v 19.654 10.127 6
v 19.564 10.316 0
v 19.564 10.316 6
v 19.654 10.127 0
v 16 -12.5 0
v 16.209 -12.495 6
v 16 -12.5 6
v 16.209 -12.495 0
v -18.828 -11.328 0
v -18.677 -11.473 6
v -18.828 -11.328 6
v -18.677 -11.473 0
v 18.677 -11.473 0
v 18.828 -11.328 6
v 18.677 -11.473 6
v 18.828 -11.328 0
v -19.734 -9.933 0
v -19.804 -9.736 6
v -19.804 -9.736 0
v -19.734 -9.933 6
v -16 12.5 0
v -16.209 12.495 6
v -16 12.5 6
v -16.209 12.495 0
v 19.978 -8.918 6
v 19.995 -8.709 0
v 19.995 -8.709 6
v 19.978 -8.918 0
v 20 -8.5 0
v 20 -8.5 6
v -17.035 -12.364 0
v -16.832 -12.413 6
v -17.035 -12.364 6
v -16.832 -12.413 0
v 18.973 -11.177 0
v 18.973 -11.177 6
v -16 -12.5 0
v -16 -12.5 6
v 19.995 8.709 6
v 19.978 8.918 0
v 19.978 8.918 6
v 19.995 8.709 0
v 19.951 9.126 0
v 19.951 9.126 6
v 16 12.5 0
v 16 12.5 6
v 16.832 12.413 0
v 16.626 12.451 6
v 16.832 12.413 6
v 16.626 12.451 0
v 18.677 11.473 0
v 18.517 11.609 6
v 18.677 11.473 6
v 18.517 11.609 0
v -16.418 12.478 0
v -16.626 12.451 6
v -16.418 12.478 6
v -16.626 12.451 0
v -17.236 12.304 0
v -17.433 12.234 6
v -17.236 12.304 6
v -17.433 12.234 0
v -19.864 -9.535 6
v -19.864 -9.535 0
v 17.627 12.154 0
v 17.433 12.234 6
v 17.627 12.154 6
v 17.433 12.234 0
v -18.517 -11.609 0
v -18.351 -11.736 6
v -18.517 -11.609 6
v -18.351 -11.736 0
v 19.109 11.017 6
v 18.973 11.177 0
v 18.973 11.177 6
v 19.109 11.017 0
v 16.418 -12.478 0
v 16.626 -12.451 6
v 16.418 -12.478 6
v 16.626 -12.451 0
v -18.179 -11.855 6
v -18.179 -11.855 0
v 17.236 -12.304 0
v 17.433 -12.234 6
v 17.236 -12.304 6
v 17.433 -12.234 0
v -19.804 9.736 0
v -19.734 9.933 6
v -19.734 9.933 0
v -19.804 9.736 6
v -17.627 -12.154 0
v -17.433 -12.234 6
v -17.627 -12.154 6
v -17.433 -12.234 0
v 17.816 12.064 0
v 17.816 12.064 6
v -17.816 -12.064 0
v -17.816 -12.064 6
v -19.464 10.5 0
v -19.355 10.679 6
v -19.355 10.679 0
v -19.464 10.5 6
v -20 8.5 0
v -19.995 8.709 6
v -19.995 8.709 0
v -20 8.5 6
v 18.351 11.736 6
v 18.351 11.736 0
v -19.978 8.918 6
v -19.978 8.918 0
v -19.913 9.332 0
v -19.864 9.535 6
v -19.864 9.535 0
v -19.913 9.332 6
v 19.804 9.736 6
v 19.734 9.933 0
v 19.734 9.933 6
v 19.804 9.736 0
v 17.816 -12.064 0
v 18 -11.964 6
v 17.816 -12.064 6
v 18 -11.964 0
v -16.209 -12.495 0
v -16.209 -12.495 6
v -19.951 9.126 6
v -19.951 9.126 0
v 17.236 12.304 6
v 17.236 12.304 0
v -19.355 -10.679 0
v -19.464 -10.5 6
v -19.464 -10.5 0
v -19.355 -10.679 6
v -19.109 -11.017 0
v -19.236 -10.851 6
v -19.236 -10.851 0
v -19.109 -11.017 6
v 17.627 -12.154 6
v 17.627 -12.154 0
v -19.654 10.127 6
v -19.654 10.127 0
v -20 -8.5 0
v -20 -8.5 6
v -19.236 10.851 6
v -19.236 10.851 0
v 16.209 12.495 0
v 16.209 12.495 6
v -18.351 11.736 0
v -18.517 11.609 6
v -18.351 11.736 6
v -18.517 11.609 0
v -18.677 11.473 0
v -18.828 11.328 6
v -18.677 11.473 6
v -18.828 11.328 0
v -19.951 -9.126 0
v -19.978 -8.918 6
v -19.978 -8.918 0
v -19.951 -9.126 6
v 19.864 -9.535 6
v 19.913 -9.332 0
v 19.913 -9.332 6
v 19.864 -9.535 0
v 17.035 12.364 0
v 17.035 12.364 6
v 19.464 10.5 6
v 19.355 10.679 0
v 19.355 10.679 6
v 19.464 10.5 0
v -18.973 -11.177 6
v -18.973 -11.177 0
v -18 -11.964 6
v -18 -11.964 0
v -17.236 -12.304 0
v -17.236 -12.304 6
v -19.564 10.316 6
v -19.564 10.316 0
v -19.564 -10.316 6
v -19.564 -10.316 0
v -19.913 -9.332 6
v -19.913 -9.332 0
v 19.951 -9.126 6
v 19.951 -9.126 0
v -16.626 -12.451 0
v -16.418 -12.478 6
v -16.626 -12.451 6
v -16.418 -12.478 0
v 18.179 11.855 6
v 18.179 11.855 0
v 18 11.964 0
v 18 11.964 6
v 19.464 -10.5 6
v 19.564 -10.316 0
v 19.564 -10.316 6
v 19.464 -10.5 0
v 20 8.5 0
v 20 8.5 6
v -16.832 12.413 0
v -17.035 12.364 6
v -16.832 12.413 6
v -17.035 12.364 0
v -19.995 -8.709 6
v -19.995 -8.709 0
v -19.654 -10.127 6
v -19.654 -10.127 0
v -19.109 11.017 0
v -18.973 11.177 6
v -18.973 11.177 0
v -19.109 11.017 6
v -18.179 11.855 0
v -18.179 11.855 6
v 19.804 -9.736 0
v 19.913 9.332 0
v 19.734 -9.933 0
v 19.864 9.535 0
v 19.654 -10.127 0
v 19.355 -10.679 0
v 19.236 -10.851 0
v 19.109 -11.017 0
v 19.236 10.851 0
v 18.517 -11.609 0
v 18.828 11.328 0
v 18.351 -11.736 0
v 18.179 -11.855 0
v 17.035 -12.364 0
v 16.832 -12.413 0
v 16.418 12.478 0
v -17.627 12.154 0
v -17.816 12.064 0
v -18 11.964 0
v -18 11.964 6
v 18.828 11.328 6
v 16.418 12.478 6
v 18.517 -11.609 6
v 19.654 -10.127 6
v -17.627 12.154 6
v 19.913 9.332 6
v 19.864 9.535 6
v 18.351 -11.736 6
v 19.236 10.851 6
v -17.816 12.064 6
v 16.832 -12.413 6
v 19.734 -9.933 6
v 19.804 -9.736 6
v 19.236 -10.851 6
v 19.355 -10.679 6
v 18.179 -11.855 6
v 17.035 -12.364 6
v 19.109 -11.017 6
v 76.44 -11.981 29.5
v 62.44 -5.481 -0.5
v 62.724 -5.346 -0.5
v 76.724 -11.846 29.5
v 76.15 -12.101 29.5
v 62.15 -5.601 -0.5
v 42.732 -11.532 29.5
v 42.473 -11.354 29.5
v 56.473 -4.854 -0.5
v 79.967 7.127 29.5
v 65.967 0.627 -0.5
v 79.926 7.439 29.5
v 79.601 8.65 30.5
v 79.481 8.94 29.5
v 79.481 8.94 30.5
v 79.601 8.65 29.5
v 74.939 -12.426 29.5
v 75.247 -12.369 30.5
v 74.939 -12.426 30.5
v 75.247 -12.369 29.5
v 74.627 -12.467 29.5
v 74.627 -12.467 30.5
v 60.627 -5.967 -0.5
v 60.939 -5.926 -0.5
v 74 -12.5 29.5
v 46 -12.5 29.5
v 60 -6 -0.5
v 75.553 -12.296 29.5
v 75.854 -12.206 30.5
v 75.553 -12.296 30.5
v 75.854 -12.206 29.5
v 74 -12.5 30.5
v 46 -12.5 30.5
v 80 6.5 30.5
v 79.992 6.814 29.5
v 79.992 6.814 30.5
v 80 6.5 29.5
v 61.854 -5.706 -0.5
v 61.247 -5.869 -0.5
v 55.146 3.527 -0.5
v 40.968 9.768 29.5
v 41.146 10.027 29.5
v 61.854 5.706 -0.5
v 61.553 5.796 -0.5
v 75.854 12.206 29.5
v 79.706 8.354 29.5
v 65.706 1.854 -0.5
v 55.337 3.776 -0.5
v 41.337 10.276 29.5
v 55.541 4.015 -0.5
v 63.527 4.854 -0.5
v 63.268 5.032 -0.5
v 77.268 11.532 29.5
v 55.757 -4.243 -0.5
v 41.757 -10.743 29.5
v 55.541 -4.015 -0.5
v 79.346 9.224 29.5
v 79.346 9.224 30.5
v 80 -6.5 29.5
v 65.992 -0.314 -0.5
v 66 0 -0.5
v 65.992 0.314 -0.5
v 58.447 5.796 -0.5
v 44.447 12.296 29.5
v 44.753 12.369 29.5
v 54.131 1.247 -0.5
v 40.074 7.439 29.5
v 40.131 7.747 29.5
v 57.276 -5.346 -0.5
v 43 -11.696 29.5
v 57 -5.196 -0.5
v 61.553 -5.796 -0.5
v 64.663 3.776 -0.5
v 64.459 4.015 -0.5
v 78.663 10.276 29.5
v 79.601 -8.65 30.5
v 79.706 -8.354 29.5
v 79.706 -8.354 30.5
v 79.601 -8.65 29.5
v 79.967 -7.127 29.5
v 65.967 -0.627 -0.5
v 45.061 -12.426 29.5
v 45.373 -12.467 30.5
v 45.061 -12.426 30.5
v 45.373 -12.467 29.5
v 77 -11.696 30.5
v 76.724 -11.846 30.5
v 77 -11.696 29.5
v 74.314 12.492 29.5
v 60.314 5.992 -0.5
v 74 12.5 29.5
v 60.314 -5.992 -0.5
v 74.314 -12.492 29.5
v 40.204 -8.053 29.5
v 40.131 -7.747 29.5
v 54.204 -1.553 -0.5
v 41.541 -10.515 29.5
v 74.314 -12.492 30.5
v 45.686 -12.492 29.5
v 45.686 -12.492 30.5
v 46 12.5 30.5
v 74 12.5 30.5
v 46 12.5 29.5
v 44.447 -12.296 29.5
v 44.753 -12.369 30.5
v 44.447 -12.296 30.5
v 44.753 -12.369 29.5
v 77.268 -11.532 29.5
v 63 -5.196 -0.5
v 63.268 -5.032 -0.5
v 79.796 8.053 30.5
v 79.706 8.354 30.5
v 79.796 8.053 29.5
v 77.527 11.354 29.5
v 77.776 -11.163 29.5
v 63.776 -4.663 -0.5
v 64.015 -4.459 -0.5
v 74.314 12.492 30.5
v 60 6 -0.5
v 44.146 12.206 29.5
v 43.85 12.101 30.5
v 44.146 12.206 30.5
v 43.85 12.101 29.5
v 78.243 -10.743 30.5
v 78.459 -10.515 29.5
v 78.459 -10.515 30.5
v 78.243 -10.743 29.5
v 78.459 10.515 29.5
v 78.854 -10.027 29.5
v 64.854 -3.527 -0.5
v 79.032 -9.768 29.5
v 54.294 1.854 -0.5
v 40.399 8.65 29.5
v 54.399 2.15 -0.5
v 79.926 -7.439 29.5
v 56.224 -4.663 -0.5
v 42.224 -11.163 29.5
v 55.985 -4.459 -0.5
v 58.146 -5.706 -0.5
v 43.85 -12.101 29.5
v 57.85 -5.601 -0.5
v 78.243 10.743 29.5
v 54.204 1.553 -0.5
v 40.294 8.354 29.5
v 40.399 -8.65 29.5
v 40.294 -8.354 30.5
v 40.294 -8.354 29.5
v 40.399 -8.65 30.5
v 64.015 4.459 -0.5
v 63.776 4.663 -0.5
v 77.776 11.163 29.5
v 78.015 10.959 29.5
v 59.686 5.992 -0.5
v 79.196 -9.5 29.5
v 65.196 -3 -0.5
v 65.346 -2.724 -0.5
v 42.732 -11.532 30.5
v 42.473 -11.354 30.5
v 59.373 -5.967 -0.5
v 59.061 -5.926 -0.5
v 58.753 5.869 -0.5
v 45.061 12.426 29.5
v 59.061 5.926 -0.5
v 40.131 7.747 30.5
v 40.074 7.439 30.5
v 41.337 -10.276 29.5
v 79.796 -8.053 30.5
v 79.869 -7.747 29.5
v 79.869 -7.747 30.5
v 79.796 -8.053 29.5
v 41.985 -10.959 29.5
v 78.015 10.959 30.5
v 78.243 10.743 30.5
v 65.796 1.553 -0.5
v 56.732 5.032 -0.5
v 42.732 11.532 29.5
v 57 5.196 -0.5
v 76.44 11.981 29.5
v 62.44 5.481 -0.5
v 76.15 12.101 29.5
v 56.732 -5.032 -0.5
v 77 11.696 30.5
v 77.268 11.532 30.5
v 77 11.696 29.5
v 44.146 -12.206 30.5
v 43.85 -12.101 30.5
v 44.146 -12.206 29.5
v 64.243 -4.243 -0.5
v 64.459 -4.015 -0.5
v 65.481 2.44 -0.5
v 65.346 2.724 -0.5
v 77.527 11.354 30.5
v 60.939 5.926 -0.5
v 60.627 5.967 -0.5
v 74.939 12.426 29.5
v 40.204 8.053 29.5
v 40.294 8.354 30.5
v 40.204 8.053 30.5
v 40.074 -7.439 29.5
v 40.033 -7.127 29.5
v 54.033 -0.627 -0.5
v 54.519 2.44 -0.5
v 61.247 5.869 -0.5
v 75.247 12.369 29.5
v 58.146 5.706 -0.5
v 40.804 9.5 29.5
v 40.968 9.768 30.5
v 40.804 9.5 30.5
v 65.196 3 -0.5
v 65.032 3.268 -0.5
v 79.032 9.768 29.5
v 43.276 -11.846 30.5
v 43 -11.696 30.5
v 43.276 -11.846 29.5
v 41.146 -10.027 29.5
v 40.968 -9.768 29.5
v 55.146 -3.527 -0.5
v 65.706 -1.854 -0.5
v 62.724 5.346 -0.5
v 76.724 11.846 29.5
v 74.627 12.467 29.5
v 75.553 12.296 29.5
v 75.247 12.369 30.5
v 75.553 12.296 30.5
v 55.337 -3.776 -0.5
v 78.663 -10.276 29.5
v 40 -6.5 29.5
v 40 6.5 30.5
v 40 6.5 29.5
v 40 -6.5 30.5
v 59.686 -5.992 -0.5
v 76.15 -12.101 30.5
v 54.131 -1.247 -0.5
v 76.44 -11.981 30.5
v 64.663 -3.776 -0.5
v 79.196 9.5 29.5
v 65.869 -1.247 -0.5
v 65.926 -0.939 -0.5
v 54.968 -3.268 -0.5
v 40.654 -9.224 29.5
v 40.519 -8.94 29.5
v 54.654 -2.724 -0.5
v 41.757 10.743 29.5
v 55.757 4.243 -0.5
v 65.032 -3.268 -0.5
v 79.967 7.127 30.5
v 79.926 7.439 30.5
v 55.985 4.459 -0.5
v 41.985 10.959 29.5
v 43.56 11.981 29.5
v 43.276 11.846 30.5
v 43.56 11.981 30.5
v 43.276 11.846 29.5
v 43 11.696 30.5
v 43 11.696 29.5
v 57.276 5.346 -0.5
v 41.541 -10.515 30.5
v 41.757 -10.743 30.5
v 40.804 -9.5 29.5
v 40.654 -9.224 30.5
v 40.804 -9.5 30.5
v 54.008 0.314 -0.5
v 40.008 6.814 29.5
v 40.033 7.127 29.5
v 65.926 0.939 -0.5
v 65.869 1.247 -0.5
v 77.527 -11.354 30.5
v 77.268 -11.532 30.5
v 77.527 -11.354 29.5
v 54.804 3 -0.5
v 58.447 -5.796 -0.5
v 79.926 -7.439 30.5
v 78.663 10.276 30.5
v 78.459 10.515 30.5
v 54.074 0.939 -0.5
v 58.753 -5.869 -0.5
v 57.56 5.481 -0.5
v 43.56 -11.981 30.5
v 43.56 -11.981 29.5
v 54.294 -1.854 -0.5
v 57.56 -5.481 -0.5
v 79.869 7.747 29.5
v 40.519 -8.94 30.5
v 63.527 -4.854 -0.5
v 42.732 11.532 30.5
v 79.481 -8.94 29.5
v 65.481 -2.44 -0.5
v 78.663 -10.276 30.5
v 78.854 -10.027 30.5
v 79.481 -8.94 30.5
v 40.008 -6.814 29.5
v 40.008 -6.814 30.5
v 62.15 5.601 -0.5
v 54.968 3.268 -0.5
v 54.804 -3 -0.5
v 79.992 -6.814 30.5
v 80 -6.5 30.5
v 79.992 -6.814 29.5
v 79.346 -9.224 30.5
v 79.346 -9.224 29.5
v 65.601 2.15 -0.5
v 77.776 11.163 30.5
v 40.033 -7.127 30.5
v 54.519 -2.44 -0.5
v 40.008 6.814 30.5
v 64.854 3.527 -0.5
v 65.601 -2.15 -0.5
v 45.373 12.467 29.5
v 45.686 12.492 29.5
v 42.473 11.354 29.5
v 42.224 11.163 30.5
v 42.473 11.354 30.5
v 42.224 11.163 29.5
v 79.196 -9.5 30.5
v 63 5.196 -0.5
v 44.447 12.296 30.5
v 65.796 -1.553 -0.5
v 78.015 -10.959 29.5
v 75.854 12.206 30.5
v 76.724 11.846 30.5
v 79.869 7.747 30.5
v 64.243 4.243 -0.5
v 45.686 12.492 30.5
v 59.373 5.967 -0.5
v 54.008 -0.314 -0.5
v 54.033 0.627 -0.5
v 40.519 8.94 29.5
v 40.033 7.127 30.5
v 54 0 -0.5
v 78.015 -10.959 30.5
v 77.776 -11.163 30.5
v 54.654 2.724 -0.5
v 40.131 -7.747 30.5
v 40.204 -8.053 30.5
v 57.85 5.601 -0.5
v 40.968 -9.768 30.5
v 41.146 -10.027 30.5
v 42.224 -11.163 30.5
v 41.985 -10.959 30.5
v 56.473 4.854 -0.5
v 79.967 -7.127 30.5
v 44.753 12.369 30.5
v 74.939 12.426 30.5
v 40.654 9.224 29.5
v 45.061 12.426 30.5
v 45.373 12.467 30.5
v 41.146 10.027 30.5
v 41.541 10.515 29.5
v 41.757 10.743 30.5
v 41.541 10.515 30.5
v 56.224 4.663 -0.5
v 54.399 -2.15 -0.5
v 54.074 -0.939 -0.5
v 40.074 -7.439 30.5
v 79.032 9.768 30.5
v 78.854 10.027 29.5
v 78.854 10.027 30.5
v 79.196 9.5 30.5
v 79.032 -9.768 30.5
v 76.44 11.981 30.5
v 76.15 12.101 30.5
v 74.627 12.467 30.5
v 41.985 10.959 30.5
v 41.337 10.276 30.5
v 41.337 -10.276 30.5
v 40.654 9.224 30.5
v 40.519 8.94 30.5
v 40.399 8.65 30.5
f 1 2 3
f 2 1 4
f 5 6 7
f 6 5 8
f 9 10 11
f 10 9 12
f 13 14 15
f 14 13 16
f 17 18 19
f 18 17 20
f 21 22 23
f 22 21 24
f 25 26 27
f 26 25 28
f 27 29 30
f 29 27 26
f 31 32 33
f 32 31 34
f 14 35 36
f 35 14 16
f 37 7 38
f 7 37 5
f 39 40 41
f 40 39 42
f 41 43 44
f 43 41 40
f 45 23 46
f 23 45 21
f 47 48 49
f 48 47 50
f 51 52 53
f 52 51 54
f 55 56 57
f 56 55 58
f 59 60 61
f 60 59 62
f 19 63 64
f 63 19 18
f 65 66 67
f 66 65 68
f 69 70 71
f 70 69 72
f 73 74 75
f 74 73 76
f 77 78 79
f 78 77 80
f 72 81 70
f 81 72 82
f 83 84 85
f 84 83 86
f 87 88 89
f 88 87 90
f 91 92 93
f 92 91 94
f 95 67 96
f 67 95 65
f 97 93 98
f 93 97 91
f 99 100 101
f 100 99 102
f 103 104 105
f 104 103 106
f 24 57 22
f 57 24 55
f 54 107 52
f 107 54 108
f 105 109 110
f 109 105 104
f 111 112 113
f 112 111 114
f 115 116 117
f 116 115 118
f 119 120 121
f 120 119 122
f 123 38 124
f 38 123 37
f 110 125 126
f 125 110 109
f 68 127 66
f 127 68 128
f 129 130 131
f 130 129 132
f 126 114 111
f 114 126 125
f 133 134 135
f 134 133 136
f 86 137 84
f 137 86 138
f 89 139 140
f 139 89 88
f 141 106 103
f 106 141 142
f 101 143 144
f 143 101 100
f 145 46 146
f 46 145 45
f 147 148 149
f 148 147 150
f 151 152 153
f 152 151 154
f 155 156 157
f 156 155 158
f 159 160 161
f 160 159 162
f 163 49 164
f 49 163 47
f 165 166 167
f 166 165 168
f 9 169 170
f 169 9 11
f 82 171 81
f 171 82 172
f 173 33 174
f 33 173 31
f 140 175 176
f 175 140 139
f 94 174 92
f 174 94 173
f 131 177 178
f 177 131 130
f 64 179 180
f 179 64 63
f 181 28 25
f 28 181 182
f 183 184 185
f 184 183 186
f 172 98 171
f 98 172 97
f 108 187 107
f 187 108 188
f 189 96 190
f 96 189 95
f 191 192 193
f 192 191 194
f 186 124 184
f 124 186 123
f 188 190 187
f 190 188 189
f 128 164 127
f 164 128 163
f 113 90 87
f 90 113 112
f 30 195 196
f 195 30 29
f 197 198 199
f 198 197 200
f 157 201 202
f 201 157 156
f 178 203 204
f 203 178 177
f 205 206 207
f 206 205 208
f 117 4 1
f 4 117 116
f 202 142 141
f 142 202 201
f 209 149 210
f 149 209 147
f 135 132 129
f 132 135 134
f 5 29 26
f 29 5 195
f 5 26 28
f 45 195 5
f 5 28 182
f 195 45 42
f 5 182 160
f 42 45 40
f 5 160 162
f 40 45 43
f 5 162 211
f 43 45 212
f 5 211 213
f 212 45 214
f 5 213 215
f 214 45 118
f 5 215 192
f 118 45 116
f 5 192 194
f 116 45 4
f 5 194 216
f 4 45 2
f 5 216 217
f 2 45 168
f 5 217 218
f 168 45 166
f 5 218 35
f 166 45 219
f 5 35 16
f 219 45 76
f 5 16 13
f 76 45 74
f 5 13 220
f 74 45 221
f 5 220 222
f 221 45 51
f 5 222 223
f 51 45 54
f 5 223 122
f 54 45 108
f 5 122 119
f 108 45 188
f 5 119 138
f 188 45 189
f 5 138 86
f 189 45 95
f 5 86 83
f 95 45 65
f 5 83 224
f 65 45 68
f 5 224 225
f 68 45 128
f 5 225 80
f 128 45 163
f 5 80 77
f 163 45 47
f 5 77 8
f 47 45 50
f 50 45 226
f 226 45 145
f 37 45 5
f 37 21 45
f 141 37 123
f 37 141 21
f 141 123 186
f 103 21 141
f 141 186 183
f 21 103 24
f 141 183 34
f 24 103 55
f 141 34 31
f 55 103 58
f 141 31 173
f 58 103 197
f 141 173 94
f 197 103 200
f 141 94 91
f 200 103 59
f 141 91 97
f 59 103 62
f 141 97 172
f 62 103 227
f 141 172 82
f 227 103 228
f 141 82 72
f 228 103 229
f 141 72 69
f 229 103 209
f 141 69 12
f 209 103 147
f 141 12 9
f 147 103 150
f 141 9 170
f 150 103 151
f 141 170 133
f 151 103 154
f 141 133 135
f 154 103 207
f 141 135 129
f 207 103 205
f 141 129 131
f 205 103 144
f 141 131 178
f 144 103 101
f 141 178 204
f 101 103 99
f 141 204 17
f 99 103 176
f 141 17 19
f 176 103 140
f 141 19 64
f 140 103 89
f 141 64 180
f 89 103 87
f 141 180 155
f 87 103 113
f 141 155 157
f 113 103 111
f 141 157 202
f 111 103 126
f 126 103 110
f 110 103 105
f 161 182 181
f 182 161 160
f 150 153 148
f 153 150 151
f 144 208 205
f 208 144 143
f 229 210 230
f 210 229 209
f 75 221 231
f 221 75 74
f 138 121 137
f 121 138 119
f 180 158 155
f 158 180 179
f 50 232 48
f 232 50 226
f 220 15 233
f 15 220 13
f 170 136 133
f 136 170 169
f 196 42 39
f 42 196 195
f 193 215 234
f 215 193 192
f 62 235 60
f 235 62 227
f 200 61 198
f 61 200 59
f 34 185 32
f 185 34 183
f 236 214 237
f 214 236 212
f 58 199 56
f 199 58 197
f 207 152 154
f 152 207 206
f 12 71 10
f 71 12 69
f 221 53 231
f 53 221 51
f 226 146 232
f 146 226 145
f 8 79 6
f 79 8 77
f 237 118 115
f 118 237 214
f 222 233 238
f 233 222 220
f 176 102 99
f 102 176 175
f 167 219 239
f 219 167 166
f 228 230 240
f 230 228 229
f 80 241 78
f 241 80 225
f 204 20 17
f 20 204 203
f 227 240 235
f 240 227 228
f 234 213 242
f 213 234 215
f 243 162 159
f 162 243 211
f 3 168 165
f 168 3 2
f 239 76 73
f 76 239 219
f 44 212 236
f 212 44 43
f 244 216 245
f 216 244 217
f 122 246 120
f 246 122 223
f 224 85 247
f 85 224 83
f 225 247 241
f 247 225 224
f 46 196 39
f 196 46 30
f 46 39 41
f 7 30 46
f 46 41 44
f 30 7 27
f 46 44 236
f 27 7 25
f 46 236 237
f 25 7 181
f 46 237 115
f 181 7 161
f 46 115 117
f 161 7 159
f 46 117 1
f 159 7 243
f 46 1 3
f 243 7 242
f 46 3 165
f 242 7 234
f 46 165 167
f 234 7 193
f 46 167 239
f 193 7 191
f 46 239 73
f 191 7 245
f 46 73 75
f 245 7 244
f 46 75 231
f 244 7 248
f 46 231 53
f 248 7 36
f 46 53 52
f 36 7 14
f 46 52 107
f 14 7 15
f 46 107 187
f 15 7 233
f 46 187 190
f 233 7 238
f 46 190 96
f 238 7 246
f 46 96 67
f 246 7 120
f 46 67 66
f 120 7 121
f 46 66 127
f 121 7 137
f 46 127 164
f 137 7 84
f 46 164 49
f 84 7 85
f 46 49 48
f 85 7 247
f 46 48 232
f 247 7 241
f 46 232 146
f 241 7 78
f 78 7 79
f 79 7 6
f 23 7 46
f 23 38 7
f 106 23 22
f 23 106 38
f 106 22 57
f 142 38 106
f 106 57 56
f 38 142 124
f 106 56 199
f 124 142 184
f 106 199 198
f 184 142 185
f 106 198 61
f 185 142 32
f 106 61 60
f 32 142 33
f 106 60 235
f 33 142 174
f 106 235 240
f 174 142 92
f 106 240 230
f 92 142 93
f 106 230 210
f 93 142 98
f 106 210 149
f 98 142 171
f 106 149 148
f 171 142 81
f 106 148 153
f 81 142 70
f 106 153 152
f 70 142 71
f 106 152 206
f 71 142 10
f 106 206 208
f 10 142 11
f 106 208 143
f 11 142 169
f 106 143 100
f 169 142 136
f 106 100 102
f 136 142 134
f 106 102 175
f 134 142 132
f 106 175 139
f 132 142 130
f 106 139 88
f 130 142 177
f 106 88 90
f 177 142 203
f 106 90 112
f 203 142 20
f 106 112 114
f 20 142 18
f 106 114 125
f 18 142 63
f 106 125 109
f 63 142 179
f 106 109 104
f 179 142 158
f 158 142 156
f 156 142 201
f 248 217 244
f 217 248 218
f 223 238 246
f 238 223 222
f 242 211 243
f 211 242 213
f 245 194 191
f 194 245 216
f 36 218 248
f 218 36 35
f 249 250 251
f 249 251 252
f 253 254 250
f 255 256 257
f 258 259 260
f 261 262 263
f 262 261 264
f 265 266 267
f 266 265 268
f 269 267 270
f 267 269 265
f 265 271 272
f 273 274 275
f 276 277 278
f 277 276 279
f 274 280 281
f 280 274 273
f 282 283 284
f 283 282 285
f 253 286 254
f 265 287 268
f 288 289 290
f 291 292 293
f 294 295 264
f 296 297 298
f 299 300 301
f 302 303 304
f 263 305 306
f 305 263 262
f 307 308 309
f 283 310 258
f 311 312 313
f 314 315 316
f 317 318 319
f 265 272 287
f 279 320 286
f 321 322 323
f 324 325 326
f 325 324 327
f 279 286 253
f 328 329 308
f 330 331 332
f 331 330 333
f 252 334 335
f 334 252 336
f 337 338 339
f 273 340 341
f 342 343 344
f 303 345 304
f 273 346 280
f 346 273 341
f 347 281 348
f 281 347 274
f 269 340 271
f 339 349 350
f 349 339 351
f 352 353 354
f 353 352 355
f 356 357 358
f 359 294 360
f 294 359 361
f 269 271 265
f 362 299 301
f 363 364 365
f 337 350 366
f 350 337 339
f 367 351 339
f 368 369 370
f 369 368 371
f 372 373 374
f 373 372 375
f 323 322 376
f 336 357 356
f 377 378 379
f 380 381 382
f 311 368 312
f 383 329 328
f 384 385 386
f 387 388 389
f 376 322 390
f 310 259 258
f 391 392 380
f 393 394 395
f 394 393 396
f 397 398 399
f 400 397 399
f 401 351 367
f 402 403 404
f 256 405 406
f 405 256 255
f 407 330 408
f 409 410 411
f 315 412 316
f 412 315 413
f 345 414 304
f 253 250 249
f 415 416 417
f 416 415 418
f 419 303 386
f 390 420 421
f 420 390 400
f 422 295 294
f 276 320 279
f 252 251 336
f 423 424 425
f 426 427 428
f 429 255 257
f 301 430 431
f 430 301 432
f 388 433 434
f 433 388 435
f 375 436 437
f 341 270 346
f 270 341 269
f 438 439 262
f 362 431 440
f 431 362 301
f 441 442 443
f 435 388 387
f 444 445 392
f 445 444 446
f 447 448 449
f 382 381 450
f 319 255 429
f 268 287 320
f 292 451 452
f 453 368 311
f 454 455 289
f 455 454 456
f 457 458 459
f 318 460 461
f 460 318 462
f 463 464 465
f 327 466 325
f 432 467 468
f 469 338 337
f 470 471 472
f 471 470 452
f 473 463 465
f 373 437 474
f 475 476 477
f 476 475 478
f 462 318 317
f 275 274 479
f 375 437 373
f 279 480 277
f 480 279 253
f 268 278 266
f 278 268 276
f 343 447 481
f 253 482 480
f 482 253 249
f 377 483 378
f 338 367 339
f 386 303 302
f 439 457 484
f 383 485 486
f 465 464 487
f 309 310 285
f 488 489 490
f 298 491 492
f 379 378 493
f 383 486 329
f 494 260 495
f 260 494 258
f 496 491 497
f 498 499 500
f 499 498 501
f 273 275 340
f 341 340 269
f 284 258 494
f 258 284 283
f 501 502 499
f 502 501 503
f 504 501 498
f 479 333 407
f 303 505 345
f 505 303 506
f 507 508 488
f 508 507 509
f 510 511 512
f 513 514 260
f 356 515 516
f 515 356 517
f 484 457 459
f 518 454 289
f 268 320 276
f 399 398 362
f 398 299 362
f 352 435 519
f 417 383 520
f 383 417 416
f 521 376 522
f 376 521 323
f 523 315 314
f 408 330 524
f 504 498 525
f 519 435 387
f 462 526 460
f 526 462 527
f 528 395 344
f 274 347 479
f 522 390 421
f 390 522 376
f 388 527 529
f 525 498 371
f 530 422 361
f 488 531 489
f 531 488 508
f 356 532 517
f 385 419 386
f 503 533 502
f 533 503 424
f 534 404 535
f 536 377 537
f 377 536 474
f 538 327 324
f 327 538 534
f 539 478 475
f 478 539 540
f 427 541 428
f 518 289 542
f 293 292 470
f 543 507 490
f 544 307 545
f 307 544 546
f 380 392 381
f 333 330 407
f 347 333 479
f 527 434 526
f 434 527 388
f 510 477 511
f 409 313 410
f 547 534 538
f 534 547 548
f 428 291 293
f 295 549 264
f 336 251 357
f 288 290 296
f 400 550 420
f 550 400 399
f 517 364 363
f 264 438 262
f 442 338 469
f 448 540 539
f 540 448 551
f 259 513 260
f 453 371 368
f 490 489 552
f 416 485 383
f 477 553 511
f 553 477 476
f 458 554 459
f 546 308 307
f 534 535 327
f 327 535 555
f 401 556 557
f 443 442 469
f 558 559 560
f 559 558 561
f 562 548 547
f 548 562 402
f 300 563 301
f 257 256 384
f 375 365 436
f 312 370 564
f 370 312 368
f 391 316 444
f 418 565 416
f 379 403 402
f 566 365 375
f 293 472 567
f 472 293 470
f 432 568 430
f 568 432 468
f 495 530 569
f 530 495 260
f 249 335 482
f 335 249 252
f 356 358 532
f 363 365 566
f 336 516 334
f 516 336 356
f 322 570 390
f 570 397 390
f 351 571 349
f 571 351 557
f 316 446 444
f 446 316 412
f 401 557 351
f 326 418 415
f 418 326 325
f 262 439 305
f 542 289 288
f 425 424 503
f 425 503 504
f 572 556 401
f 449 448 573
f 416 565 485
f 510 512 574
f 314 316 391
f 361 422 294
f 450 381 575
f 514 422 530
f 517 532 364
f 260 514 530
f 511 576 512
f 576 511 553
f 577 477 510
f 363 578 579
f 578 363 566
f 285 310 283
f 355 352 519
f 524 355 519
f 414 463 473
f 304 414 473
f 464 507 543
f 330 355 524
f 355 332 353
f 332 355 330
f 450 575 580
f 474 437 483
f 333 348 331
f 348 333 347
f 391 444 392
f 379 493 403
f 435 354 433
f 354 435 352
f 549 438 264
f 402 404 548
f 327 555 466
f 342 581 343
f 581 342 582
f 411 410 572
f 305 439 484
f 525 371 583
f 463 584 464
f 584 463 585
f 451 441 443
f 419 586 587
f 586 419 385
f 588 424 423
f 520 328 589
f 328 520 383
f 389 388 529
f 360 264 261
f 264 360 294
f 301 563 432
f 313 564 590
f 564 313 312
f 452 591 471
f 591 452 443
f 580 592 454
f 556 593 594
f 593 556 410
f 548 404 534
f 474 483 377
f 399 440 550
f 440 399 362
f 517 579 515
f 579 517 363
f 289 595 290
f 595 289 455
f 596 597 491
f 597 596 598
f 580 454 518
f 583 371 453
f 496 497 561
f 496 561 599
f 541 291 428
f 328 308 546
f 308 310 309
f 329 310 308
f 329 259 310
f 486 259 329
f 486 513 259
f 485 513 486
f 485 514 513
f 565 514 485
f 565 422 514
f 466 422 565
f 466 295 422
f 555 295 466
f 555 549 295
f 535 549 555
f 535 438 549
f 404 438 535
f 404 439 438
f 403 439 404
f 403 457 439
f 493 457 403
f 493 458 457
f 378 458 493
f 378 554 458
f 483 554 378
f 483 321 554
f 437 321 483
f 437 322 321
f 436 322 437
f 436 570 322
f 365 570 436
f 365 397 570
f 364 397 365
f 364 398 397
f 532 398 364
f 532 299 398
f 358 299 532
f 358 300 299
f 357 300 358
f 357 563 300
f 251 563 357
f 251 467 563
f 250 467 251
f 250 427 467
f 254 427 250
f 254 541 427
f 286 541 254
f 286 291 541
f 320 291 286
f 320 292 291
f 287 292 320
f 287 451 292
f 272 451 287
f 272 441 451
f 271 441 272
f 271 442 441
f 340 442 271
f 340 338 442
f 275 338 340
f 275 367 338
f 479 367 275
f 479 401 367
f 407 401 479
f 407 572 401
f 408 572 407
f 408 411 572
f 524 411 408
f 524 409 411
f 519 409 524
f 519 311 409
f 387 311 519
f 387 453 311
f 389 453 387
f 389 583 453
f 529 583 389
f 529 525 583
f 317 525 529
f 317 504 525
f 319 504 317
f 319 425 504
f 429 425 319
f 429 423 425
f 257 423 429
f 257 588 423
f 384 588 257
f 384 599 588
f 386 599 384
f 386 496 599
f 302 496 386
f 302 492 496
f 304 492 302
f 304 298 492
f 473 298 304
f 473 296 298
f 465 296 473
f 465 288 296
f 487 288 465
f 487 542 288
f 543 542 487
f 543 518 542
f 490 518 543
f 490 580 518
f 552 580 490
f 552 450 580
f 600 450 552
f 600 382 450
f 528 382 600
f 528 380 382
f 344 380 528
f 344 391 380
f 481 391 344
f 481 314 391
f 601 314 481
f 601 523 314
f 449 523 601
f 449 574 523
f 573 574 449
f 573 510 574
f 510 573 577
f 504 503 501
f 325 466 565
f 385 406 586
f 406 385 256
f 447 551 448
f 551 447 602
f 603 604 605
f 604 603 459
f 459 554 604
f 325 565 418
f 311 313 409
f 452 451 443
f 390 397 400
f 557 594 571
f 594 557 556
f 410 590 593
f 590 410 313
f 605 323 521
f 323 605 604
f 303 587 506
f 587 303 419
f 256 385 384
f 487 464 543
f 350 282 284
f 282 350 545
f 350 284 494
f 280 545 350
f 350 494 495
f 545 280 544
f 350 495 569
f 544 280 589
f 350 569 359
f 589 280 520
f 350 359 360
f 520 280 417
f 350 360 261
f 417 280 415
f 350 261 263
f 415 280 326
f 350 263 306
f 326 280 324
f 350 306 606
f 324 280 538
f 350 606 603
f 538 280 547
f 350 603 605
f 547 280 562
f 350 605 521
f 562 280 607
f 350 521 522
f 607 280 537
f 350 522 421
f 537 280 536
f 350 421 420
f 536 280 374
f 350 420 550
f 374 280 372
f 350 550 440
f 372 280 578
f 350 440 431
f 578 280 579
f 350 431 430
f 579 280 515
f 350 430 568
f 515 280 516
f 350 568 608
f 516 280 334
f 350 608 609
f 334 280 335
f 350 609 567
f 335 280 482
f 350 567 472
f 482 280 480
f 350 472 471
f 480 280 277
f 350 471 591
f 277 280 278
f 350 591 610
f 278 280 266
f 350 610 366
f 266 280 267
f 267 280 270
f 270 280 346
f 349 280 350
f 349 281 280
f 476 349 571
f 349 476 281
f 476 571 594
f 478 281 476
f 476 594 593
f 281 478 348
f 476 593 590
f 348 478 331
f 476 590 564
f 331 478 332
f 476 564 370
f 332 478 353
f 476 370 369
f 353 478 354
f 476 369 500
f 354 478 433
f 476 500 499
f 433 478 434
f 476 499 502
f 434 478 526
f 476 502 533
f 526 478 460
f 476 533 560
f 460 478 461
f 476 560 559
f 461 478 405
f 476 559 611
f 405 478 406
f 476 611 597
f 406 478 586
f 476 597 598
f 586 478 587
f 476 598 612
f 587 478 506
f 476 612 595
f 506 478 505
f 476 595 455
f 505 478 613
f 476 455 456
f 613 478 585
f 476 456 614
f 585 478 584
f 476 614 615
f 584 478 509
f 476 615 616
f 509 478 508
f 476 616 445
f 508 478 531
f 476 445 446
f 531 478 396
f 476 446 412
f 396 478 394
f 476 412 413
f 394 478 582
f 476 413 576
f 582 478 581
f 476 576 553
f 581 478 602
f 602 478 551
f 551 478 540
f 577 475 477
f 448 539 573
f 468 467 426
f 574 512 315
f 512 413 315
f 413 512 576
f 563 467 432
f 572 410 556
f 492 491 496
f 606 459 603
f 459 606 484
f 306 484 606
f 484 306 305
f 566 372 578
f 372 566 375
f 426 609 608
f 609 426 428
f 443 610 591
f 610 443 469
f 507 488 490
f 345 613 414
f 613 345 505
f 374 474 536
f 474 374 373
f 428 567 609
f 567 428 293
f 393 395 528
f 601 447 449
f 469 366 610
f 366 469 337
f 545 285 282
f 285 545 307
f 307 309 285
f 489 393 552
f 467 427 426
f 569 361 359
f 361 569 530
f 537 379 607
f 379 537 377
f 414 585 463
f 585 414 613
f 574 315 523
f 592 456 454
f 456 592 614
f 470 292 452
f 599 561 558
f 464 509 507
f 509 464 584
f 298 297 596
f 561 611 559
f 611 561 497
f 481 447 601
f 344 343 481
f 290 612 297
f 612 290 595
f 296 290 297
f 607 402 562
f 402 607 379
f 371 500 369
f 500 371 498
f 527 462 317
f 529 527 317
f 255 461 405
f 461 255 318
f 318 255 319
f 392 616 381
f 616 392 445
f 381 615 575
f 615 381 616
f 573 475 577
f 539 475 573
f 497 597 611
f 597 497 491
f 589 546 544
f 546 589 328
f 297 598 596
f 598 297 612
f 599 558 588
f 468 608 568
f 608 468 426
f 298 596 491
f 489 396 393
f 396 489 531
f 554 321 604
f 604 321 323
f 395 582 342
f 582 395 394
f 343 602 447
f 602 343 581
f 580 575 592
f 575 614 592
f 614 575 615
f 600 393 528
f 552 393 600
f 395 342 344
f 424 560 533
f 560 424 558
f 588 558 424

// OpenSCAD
// Shared geometry helpers.
// GPL-3.0-or-later
// Units: mm

// These names are deliberately unprefixed because this project carries no
// library that defines them. A local module silently shadows a library one of
// the same name with no warning at all, so check for collisions before adding
// BOSL2, NopSCADlib or anything else global to this repo.

// This file never sets $fn: it is the consumer's to choose, and it crosses a
// `use <>` boundary as a special variable.

/**
 * Largest corner radius a rounded_square of this size can actually take.
 * offset() silently produces degenerate geometry once the radius exceeds half
 * the short side, so the request is clamped rather than left to misbehave.
 */
function fitted_radius(x, y, radius) = min(radius, min(x, y) / 2 - 0.01);

// Rectangle of x by y centred on the origin, corners rounded to `radius`.
module rounded_square(x, y, radius = 0) {
  assert(x > 0 && y > 0, str("rounded_square: x and y must be > 0, got: ", [x, y]));
  assert(radius >= 0, str("rounded_square: radius must be >= 0, got: ", radius));

  _radius = fitted_radius(x, y, radius);

  if (_radius <= 0) {
    square([x, y], center=true);
  } else {
    // offset out then in leaves the outer corners rounded and the size intact.
    offset(r=_radius) offset(delta=-_radius) square([x, y], center=true);
  }
}

// Extrusion of rounded_square, sitting on z = 0.
module rounded_box(x, y, z, radius = 0) {
  assert(z > 0, str("rounded_box: z must be > 0, got: ", z));

  linear_extrude(height=z) rounded_square(x, y, radius);
}

/**
 * Loft between two 2D sections, the first at z0 and the second at z1.
 *
 * Each section is extruded into a thin slab centred on its z and the two are
 * hulled. The slab has thickness so that adjoining lofts overlap and weld into
 * one solid instead of meeting on a coincident face, which CGAL will not always
 * resolve. Because the hull is taken between the slab EDGES, the resulting
 * taper runs from the bottom of the lower slab to the bottom of the upper one,
 * so z1 - z0 is the true rise of the sloped face.
 *
 * The two slabs are sized independently because a section that is already
 * buried inside an adjoining solid can be given extra thickness to guarantee
 * the weld without disturbing the exposed profile.
 */
module loft(z0, z1, slab0 = 1, slab1 = 1) {
  assert(z1 > z0, str("loft: z1 must be > z0, got: ", [z0, z1]));
  assert(slab0 > 0 && slab1 > 0, str("loft: slabs must be > 0, got: ", [slab0, slab1]));

  hull() {
    translate([0, 0, z0 - slab0 / 2]) linear_extrude(height=slab0) children(0);
    translate([0, 0, z1 - slab1 / 2]) linear_extrude(height=slab1) children(1);
  }
}

// Standalone preview. $fn is passed on the call, never assigned at top level --
// see docs/design-notes.md. `use <>` does not run this; `include <>` would.
rounded_box(40, 25, 6, 4, $fn=$preview ? 48 : 120);
translate([60, 0, 0]) loft(0, 30, $fn=$preview ? 48 : 120) {
    circle(d=12);
    rounded_square(40, 25, 6);
  }
